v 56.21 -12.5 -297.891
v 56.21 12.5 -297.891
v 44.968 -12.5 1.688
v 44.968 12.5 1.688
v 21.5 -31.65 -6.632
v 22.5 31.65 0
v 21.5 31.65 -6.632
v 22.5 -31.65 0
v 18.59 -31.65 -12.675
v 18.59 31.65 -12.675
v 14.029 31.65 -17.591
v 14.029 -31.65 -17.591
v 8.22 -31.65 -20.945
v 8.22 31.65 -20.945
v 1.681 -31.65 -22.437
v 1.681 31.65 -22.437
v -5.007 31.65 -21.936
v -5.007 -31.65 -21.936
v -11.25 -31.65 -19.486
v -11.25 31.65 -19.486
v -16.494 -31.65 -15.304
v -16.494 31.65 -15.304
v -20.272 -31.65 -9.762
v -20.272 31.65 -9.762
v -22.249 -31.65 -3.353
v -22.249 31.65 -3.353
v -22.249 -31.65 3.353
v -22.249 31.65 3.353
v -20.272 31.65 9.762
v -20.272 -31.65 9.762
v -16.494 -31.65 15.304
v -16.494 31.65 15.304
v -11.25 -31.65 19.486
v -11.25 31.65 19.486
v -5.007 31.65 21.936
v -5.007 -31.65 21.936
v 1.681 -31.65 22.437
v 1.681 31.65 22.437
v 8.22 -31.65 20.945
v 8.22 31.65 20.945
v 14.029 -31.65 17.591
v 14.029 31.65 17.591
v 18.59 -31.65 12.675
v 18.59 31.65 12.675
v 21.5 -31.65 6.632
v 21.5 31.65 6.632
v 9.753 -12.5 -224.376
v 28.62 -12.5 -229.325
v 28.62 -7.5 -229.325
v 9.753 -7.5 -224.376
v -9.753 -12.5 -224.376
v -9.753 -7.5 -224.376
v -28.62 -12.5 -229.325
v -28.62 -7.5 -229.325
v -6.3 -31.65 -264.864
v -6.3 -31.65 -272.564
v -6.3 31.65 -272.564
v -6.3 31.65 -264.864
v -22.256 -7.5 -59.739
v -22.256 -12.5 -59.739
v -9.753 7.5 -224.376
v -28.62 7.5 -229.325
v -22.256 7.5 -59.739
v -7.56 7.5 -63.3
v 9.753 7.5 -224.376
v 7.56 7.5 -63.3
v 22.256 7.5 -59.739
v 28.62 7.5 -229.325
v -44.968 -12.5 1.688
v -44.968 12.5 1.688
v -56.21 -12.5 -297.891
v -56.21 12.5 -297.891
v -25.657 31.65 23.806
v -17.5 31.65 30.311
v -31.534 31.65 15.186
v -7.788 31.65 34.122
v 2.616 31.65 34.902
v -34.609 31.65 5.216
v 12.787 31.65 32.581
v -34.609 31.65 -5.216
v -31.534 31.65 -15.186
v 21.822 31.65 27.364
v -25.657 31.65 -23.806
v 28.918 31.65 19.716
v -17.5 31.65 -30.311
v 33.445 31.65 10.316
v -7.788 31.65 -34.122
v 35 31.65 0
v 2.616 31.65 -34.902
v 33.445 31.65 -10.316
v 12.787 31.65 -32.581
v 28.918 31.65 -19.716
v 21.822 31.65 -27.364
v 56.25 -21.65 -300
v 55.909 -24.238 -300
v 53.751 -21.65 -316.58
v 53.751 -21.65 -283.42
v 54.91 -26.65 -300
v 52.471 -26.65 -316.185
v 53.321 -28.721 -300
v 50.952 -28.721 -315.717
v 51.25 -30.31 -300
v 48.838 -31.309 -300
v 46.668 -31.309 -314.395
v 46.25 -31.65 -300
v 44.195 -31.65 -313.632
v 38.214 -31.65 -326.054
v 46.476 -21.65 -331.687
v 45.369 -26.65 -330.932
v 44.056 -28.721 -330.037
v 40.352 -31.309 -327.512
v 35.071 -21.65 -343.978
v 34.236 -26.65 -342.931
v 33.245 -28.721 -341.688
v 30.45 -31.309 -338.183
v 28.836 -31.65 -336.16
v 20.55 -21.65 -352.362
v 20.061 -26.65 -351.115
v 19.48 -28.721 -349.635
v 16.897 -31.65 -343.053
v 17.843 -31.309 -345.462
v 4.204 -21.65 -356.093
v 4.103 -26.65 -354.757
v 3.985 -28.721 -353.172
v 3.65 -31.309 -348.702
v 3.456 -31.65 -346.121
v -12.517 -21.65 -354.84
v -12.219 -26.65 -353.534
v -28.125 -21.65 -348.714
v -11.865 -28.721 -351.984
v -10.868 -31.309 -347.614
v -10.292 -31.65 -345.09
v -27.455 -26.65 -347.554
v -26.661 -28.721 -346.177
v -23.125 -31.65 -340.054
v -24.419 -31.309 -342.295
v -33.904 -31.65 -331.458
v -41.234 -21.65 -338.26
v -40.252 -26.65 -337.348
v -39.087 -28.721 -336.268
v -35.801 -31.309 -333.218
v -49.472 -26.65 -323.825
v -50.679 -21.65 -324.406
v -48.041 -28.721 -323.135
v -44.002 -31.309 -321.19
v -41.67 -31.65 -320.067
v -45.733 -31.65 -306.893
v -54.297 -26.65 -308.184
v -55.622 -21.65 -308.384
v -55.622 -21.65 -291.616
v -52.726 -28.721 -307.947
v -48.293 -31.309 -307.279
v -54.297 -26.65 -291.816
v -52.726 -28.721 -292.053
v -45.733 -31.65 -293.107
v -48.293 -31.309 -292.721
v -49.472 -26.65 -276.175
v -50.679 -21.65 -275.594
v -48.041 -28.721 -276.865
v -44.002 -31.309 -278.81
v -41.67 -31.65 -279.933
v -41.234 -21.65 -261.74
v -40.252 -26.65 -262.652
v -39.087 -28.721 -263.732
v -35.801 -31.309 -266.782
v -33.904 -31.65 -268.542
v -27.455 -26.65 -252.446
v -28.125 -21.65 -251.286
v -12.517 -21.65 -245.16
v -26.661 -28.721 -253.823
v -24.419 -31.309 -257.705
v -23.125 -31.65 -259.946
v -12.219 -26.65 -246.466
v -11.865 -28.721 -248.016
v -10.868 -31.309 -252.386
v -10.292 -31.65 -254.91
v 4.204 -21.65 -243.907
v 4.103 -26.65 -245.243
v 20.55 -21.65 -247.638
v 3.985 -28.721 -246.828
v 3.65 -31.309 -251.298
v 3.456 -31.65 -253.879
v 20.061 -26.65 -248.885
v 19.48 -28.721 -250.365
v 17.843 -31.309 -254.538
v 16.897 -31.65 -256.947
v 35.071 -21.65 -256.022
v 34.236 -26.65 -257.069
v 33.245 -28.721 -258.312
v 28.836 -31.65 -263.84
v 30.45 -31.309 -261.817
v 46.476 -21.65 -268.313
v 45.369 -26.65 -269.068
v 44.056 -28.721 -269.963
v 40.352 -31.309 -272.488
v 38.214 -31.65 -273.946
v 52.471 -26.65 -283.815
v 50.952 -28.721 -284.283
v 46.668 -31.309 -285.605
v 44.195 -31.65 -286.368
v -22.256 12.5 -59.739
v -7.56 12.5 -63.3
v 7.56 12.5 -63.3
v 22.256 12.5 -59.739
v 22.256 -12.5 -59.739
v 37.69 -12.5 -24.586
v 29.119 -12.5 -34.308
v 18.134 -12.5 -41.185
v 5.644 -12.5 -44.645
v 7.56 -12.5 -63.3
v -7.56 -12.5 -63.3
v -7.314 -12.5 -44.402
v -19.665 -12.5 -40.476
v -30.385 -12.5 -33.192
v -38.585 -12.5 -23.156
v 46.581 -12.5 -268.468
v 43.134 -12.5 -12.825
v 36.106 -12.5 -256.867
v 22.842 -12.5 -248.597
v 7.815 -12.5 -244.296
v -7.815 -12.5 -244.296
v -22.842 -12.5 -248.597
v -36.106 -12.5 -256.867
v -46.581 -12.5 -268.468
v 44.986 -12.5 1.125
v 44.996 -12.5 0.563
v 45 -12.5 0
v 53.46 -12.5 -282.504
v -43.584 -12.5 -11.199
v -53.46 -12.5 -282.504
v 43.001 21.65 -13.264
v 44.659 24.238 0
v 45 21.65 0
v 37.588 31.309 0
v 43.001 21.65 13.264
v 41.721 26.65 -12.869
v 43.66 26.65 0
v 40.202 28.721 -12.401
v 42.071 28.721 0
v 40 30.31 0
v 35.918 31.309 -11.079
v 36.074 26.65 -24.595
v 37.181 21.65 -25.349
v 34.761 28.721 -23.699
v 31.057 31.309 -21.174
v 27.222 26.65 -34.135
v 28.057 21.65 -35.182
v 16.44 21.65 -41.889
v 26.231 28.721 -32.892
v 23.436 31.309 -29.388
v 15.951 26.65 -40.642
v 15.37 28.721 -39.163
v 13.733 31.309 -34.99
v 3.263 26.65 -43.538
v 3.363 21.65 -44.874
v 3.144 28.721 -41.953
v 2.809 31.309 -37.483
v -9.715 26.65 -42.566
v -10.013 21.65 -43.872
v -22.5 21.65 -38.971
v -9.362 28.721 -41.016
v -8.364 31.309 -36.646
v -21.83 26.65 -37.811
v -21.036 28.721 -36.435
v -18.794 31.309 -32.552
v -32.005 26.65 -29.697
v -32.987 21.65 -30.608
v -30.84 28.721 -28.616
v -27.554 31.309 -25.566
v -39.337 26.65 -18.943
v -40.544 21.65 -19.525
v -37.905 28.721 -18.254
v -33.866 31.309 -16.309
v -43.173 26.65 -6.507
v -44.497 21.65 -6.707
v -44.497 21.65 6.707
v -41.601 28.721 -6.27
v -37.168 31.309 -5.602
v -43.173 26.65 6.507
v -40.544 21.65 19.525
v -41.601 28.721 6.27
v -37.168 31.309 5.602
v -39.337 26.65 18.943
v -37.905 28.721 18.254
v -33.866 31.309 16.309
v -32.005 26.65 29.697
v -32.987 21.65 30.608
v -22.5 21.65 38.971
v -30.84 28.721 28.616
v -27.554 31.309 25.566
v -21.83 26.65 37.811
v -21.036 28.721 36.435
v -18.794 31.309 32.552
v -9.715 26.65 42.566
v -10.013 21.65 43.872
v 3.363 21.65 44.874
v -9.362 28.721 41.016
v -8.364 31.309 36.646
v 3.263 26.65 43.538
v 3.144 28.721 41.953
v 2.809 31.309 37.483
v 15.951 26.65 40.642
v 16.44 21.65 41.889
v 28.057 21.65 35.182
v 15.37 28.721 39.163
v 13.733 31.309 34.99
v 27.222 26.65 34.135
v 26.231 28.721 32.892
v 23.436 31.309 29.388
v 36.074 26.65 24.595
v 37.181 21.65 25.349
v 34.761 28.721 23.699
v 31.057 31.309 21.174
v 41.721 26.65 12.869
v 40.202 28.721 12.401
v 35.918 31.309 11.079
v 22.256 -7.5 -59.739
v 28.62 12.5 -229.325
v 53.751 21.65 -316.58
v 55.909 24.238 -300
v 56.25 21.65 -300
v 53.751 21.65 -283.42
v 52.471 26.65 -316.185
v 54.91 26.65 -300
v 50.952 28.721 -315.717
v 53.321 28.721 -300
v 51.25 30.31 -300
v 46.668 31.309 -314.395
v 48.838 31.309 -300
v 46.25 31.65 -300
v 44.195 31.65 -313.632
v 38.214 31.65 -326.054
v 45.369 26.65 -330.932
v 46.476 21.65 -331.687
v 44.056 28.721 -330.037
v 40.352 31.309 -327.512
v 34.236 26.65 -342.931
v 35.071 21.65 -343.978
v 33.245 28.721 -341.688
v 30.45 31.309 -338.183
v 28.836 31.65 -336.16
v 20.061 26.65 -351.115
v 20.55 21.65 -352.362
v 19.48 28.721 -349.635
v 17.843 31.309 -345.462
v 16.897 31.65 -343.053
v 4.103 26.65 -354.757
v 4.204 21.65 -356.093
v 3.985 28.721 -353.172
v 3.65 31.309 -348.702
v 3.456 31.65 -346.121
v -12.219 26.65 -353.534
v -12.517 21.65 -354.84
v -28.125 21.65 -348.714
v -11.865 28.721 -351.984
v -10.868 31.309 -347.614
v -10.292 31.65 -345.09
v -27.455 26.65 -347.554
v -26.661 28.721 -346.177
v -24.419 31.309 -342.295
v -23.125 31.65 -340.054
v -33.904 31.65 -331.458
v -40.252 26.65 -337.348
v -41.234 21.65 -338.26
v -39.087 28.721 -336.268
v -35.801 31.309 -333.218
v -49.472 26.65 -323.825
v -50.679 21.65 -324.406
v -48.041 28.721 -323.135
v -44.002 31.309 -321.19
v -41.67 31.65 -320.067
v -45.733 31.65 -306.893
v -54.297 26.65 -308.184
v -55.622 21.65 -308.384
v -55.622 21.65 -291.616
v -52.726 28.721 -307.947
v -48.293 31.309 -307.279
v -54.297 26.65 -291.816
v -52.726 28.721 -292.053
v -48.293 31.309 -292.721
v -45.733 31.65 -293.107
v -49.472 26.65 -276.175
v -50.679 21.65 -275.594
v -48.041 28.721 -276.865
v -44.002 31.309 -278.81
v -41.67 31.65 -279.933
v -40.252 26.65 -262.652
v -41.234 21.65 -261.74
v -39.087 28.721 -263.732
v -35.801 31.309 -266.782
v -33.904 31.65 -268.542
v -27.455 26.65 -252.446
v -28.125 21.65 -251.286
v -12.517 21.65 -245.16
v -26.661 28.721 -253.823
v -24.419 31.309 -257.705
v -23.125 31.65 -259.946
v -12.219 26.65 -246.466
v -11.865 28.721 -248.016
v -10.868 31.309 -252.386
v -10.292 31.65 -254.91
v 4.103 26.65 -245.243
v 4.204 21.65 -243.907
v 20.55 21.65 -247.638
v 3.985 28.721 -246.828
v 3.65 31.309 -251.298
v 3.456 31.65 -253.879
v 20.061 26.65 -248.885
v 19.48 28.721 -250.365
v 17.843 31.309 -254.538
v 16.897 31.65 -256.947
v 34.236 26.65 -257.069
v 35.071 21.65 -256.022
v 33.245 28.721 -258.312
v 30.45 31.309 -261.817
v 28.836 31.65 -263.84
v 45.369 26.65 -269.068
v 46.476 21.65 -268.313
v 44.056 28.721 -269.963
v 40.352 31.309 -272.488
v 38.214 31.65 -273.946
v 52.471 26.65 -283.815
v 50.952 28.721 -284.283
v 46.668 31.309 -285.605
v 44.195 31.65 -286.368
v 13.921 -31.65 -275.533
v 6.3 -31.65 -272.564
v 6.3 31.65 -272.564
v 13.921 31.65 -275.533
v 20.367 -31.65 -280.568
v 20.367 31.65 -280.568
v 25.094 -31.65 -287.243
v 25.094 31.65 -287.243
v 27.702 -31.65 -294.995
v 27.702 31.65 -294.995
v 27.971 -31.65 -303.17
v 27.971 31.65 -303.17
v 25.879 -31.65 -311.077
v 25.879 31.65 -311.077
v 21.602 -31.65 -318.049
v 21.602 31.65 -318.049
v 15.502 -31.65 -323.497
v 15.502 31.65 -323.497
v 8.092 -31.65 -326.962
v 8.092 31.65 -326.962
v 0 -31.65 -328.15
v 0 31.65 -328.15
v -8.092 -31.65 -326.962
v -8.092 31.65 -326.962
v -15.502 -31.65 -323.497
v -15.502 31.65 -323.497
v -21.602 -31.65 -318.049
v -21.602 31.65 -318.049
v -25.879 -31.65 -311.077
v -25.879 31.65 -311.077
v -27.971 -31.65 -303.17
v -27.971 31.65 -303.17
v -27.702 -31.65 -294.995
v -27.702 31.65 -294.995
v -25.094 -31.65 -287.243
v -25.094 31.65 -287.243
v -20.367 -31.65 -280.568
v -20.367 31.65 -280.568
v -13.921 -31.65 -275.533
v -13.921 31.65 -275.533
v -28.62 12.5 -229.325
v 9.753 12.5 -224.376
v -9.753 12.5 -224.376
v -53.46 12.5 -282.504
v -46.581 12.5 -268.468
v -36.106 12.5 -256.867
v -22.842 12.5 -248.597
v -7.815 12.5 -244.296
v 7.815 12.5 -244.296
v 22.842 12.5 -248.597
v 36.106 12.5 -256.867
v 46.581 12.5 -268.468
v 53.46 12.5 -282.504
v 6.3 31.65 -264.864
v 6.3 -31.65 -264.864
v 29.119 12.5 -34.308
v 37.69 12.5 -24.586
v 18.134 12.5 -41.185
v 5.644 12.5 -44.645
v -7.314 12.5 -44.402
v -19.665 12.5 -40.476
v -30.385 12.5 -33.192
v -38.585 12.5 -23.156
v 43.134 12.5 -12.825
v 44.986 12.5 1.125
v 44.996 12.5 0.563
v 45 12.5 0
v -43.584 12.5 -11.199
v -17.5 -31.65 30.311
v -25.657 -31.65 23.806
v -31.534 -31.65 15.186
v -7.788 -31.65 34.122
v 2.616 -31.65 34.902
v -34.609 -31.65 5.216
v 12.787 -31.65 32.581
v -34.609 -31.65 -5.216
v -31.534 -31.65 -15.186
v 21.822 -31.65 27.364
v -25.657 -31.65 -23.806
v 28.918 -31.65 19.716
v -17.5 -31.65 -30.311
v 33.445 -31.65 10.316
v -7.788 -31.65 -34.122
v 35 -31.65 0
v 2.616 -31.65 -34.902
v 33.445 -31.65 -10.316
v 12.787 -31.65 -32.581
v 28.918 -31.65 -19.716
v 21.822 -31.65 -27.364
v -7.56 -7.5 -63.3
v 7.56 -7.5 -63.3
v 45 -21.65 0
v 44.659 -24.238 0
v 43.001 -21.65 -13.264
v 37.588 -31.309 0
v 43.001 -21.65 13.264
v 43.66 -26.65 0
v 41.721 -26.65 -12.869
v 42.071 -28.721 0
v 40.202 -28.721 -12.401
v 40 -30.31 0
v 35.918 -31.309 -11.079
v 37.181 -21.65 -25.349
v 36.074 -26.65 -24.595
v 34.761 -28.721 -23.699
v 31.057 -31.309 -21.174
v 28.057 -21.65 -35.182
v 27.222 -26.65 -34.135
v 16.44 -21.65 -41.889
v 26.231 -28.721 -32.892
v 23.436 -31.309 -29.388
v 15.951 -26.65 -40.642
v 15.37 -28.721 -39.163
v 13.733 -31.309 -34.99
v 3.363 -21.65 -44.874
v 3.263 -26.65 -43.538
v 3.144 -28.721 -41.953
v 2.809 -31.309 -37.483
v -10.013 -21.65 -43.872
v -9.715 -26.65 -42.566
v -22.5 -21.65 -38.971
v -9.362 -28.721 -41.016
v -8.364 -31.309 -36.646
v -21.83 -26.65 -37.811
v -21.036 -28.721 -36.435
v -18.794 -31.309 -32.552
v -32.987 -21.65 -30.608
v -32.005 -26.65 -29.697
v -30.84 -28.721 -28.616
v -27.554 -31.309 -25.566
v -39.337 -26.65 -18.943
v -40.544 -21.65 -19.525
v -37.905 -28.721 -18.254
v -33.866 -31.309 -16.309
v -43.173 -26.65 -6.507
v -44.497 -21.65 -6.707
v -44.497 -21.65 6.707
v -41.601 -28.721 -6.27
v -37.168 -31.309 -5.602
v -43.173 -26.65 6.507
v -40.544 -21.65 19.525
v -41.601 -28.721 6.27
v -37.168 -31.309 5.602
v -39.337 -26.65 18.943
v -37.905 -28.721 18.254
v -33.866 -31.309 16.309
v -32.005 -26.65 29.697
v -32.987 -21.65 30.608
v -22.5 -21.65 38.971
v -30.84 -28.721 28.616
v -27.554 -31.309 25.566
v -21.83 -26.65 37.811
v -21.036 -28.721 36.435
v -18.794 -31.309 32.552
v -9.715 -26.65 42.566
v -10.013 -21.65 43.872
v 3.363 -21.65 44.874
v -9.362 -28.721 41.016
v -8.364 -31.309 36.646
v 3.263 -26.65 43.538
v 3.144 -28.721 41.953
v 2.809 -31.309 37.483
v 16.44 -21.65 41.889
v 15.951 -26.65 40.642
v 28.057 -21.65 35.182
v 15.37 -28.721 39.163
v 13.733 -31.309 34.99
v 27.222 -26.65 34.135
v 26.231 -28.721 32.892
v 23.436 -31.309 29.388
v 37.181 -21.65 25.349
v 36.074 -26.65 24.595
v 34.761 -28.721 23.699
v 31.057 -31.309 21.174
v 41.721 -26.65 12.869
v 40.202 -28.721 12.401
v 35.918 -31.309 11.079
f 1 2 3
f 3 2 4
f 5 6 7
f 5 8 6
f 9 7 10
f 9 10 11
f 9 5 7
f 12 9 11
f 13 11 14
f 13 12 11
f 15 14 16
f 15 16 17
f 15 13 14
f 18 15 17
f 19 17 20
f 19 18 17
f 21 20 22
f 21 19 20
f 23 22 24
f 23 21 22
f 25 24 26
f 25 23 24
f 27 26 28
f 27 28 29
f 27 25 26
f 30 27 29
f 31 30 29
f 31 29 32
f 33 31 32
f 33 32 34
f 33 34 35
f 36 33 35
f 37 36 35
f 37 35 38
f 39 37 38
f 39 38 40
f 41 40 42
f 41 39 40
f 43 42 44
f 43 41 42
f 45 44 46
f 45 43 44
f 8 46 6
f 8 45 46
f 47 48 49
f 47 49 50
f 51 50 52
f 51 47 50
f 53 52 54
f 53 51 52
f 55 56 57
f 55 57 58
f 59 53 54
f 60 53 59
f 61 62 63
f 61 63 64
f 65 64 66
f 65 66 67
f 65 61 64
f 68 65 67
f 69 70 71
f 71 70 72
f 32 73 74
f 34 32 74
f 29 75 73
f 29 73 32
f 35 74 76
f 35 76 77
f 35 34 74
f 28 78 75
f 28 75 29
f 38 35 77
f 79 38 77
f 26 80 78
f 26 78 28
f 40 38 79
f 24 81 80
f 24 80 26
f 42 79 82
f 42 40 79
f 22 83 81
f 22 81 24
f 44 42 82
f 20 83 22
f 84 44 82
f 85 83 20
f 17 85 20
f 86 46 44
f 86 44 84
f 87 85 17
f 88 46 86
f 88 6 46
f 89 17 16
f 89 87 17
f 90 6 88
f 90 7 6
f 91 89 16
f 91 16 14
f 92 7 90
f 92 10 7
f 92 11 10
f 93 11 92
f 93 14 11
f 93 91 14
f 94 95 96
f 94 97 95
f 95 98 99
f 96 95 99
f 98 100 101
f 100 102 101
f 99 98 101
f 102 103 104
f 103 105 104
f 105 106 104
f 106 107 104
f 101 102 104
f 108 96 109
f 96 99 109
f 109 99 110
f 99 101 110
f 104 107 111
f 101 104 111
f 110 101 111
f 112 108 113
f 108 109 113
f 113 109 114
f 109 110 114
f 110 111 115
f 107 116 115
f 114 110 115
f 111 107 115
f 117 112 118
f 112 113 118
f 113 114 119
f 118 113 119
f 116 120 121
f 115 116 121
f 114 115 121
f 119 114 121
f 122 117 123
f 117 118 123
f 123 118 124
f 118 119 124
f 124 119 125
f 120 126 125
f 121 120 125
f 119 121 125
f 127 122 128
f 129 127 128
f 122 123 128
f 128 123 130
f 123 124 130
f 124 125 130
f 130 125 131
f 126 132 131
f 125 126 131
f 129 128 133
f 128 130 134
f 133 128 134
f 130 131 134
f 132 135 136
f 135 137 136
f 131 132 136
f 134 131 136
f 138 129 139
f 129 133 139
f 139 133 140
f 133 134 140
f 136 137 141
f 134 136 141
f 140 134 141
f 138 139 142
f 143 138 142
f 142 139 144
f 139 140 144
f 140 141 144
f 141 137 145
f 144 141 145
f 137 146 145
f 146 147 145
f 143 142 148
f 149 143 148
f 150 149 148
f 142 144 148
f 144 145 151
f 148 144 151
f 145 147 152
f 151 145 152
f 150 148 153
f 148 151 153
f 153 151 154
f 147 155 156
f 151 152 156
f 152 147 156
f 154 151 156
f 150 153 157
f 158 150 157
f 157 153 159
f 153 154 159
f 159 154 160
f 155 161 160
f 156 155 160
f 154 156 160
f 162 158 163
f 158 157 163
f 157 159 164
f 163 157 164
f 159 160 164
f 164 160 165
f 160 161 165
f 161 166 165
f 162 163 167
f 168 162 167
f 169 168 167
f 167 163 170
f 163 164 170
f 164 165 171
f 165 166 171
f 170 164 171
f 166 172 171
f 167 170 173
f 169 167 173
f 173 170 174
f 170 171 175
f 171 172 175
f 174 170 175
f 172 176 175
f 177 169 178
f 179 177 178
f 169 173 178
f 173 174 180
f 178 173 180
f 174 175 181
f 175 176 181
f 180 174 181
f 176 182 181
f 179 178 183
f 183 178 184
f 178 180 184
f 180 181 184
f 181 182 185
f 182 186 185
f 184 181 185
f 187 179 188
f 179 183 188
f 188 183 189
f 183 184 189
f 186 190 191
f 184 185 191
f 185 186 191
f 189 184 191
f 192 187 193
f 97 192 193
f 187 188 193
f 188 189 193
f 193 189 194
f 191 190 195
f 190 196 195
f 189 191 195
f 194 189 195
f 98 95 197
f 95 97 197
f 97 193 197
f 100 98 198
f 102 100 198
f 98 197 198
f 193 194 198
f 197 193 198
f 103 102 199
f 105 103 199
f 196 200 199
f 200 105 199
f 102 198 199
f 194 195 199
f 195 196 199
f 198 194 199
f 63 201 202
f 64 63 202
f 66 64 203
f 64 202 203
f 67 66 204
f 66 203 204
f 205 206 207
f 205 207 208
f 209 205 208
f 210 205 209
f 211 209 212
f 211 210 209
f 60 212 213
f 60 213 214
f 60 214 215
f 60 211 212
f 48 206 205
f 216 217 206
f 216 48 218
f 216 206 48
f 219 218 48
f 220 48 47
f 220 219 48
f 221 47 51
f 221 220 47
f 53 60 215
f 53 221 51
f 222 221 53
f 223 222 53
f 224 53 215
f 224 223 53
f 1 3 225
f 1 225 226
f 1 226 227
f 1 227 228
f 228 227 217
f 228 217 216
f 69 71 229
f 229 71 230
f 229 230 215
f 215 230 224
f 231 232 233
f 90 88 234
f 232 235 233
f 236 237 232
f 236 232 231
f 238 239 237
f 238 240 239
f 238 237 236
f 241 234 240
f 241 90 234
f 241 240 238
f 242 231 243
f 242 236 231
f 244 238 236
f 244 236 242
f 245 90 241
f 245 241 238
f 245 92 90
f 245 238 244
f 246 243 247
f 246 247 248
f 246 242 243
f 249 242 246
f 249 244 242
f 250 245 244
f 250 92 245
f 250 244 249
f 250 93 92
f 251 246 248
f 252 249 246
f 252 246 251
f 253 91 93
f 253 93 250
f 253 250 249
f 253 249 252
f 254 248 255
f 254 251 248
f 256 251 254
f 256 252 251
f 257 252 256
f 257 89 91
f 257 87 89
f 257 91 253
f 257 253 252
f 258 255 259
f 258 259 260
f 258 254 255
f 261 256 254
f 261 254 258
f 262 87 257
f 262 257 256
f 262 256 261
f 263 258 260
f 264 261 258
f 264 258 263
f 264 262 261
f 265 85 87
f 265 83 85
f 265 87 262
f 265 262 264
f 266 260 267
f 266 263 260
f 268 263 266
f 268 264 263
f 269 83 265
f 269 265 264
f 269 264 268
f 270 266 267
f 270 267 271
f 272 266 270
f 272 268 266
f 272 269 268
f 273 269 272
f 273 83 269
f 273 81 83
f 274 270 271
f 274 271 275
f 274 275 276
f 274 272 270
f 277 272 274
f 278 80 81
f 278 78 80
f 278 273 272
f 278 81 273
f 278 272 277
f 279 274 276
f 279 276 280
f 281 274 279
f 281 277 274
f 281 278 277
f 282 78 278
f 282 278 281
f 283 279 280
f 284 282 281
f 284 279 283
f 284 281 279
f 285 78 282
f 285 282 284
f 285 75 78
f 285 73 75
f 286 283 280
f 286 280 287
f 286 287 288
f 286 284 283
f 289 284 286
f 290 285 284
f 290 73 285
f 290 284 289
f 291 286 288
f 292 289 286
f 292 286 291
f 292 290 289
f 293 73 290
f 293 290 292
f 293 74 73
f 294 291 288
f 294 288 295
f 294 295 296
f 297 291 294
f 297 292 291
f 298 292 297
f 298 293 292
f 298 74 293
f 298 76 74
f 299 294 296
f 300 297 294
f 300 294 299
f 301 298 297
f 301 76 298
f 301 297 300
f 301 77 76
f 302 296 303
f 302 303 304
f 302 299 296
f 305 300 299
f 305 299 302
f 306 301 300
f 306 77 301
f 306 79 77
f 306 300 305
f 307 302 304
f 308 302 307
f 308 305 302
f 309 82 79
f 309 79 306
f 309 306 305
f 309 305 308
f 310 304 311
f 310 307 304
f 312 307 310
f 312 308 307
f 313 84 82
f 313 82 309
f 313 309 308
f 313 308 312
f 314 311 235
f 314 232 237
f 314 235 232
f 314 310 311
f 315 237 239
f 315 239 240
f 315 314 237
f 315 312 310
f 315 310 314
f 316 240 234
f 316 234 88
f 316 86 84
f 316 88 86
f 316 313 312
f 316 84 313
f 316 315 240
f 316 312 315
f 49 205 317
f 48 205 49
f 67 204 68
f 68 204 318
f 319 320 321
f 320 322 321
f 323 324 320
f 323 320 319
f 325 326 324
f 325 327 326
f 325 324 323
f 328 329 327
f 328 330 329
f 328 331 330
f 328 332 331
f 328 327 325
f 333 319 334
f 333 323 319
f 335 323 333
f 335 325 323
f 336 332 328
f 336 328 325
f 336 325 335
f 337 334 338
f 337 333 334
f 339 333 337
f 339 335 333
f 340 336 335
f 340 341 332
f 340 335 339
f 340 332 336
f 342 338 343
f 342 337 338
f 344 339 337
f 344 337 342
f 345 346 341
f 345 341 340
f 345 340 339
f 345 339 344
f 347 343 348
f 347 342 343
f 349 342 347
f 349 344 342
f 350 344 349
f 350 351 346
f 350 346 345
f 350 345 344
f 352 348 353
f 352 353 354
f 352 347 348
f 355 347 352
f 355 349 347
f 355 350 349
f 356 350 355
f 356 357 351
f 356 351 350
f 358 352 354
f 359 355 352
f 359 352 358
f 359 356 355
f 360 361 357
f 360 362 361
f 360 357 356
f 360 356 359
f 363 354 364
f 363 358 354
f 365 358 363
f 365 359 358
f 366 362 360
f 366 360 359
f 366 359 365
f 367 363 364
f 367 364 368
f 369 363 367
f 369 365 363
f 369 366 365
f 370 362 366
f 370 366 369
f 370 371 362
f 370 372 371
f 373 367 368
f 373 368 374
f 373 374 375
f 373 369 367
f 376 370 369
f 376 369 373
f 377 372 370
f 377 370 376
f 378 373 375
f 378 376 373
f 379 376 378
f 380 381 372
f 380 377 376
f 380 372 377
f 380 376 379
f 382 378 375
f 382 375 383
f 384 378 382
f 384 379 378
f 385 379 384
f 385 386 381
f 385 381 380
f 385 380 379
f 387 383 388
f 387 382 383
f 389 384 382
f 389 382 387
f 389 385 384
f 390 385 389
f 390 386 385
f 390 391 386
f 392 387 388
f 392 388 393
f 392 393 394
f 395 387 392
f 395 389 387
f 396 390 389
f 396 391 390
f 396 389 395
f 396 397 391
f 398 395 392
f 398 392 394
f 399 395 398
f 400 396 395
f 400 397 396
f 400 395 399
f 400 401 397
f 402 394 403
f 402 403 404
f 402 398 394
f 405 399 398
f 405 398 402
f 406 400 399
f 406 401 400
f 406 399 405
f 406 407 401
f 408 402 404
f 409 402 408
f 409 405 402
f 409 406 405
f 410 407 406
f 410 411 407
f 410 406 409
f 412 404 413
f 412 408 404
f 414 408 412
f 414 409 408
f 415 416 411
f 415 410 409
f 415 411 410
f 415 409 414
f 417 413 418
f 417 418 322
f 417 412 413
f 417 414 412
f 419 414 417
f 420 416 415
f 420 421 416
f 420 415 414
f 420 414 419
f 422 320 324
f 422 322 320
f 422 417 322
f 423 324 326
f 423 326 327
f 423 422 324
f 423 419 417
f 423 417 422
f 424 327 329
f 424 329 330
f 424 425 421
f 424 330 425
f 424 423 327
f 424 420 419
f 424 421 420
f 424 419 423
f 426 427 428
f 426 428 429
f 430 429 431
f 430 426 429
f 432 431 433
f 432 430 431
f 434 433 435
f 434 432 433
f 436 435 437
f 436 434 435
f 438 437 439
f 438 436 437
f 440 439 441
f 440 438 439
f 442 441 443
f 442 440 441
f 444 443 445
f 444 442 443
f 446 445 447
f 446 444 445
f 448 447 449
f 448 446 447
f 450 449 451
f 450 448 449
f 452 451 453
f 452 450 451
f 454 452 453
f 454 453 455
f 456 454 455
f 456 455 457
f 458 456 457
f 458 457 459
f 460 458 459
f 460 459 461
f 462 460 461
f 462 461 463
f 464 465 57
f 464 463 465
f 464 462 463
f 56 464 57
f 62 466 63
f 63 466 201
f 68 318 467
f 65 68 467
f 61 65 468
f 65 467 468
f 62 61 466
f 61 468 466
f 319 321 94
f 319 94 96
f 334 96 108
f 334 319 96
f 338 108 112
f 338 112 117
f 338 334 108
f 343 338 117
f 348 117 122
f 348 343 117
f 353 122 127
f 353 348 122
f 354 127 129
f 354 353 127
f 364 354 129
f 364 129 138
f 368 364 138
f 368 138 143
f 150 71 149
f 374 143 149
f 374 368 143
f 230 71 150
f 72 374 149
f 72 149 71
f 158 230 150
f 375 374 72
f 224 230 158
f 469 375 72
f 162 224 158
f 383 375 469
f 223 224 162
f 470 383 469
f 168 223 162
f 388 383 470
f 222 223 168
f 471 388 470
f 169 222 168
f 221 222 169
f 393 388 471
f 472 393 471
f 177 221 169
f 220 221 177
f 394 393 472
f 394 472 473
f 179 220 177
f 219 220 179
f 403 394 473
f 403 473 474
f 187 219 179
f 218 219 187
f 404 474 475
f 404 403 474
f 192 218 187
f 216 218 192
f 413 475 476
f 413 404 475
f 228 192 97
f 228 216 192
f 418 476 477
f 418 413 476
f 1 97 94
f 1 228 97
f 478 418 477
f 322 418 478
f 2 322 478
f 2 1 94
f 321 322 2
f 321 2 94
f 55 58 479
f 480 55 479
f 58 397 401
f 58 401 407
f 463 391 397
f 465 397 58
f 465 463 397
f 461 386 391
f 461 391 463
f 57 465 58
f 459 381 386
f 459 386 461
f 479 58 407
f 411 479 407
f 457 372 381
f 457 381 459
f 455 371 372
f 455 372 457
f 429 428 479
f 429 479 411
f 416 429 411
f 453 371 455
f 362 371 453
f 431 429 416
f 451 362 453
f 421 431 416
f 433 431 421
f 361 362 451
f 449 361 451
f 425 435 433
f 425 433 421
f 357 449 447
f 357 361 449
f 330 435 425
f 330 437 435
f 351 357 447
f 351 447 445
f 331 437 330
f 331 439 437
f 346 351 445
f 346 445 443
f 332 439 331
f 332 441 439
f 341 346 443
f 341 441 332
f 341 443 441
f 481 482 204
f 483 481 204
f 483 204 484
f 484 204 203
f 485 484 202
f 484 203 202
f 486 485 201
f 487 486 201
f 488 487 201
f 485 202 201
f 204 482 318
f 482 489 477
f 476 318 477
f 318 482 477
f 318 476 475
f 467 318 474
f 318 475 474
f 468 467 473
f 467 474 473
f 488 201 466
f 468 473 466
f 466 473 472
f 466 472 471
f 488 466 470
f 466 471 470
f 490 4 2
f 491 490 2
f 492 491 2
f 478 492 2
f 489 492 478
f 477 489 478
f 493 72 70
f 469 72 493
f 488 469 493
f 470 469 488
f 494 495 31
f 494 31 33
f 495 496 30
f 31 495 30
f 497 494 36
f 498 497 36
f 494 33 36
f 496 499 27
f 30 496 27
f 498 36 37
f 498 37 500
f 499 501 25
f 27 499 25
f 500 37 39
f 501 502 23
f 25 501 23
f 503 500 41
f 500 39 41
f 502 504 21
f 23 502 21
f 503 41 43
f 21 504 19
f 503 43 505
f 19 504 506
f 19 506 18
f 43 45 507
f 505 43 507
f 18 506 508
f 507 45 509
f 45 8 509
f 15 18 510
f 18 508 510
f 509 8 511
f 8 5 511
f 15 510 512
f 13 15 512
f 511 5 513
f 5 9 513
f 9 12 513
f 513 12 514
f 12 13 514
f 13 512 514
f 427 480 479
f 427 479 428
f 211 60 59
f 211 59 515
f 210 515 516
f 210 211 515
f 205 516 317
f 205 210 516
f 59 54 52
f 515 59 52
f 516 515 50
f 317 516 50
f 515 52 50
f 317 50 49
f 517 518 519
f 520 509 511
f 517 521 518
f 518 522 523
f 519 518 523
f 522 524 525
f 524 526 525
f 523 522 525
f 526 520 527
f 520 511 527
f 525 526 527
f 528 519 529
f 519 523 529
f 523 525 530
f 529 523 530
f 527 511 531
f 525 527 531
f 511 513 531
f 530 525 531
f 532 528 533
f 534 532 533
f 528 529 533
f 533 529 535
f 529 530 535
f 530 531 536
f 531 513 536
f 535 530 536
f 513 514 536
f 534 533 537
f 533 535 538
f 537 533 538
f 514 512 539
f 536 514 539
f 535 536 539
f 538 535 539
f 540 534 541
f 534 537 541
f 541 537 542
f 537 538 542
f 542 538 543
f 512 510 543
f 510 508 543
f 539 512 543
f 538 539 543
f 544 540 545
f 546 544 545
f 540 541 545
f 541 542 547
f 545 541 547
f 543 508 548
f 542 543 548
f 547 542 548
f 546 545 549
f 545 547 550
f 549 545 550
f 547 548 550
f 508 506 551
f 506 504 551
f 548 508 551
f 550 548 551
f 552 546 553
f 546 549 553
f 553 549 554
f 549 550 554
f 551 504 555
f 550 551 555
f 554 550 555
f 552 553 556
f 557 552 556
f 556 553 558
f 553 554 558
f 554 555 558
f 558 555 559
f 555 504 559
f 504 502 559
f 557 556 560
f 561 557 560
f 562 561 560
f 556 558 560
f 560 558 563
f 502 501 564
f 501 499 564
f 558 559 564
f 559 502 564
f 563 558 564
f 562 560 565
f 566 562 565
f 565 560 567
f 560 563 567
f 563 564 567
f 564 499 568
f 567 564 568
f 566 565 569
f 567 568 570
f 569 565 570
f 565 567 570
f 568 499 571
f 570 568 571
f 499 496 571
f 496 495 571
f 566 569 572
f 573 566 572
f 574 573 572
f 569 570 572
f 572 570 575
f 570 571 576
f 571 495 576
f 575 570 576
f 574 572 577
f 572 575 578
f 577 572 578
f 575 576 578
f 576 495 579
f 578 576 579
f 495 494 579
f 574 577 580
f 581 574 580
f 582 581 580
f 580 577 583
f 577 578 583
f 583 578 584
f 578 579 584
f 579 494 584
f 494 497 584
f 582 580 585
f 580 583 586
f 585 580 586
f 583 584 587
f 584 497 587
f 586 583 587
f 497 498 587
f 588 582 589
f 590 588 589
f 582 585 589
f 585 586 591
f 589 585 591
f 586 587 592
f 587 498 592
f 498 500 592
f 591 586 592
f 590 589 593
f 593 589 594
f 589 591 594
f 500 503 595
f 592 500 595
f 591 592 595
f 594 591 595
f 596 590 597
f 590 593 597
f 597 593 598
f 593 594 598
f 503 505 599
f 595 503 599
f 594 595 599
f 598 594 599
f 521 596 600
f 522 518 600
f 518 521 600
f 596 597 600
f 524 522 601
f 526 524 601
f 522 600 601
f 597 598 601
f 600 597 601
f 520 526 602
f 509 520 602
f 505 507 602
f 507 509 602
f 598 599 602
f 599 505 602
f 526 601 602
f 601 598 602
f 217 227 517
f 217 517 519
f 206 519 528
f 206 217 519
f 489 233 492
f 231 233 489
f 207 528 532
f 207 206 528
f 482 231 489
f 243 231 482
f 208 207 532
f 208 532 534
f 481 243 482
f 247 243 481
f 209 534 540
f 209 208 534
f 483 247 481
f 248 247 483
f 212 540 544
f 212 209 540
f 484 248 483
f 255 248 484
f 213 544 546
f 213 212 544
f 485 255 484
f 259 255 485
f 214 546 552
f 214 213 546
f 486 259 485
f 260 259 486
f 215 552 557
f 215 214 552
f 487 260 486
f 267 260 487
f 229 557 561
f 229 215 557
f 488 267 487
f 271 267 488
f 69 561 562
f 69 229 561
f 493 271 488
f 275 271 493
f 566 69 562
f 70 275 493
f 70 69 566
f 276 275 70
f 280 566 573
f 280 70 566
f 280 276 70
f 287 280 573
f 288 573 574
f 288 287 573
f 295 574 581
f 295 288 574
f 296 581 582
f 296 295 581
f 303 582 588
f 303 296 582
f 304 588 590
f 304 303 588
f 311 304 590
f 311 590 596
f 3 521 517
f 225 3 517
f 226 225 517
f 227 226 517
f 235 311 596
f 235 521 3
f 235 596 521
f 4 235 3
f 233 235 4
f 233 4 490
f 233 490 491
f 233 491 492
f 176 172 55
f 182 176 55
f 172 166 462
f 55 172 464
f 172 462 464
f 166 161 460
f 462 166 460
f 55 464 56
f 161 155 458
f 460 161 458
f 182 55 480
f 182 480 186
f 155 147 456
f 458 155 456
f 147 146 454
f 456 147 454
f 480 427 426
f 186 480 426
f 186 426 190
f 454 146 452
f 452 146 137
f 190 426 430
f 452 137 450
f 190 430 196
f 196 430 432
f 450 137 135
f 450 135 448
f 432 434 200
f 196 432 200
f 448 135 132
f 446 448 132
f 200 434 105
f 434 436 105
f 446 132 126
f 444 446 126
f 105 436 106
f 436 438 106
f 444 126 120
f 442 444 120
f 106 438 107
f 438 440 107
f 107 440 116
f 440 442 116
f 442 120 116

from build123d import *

# Parameters (mm, degrees)
SKETCH1_R             = 45
SKETCH1_R_2           = 22.5
BOSS_EXTRUDE1_DEPTH   = 31.65
SKETCH1_R_3           = 56.25
SKETCH1_R_4           = 28.15
BOSS_EXTRUDE1_2_DEPTH = 31.65
BOSS_EXTRUDE2_DEPTH   = 12.5
CUT_EXTRUDE1_DEPTH    = 5
CUT_EXTRUDE2_DEPTH    = 64.3
FILLET1_R             = 10


with BuildPart() as part:
    # Sketch1 → Boss-Extrude1 (new body, symmetric)
    with BuildSketch(Plane(origin=(0, 0, 0), x_dir=(1, 0, 0), z_dir=(0, 1, 0))):
        Circle(SKETCH1_R)
        Circle(SKETCH1_R_2, mode=Mode.SUBTRACT)
    extrude(amount=BOSS_EXTRUDE1_DEPTH, both=True)



with BuildPart() as body_2:
    # Sketch1 → Boss-Extrude1 2 (new body, symmetric)
    with BuildSketch(Plane(origin=(0, 0, 0), x_dir=(1, 0, 0), z_dir=(0, 1, 0))):
        with Locations((0, 300)):
            Circle(SKETCH1_R_3)
        with Locations((0, 300)):
            Circle(SKETCH1_R_4, mode=Mode.SUBTRACT)
    extrude(amount=BOSS_EXTRUDE1_2_DEPTH, both=True)


with BuildPart() as part_1:
    add(part.part)

    add(body_2.part)  # Boss-Extrude2 merges body 2
    # Sketch2 → Boss-Extrude2 (add, symmetric)
    with BuildSketch(Plane(origin=(0, 0, 0), x_dir=(1, 0, 0), z_dir=(0, 1, 0))):
        with BuildLine():
            Line((56.210435304, 297.890625), (44.968348244, -1.6875))
            ThreePointArc((44.968348244, -1.6875), (0, 45), (-44.968348244, -1.6875))
            Line((-44.968348244, -1.6875), (-56.210435304, 297.890625))
            ThreePointArc((-56.210435304, 297.890625), (0, 243.75), (56.210435304, 297.890625))
        make_face()
    extrude(amount=BOSS_EXTRUDE2_DEPTH, both=True)

    # Sketch3 → Cut-Extrude1 (cut)
    with BuildSketch(Plane(origin=(0, 12.5, 0), x_dir=(1, 0, 0), z_dir=(0, 1, 0))):
        with BuildLine():
            Line((22.255863805, 59.73892388), (28.619814412, 229.324907336))
            ThreePointArc((28.619814412, 229.324907336), (0, 223.75), (-28.619814412, 229.324907336))
            Line((-28.619814412, 229.324907336), (-22.255863805, 59.73892388))
            ThreePointArc((-22.255863805, 59.73892388), (0, 63.75), (22.255863805, 59.73892388))
        make_face()
    cut_extrude1 = extrude(amount=-CUT_EXTRUDE1_DEPTH, mode=Mode.SUBTRACT)

    # Mirror1: Cut-Extrude1 across plane
    add(cut_extrude1.mirror(Plane.ZX), mode=Mode.SUBTRACT)

    # Sketch4 → Cut-Extrude2 (cut, through all)
    with BuildSketch(Plane(origin=(0, 31.65, 0), x_dir=(1, 0, 0), z_dir=(0, 1, 0))):
        with BuildLine():
            Line((-6.3, 272.564029086), (-6.3, 264.864029086))
            Line((-6.3, 264.864029086), (6.3, 264.864029086))
            Line((6.3, 264.864029086), (6.3, 272.564029086))
            ThreePointArc((6.3, 272.564029086), (0, 328.15), (-6.3, 272.564029086))
        make_face()
    extrude(amount=-CUT_EXTRUDE2_DEPTH, mode=Mode.SUBTRACT)

    # Fillet1
    fillet1_edges = [part_1.edges().sort_by_distance(p)[0] for p in [
        (-45, -31.65, 0),
        (-56.25, 31.65, -300),
        (-56.25, -31.65, -300),
        (-45, 31.65, 0),
    ]]
    fillet(fillet1_edges, radius=FILLET1_R)


solid = part_1.part
